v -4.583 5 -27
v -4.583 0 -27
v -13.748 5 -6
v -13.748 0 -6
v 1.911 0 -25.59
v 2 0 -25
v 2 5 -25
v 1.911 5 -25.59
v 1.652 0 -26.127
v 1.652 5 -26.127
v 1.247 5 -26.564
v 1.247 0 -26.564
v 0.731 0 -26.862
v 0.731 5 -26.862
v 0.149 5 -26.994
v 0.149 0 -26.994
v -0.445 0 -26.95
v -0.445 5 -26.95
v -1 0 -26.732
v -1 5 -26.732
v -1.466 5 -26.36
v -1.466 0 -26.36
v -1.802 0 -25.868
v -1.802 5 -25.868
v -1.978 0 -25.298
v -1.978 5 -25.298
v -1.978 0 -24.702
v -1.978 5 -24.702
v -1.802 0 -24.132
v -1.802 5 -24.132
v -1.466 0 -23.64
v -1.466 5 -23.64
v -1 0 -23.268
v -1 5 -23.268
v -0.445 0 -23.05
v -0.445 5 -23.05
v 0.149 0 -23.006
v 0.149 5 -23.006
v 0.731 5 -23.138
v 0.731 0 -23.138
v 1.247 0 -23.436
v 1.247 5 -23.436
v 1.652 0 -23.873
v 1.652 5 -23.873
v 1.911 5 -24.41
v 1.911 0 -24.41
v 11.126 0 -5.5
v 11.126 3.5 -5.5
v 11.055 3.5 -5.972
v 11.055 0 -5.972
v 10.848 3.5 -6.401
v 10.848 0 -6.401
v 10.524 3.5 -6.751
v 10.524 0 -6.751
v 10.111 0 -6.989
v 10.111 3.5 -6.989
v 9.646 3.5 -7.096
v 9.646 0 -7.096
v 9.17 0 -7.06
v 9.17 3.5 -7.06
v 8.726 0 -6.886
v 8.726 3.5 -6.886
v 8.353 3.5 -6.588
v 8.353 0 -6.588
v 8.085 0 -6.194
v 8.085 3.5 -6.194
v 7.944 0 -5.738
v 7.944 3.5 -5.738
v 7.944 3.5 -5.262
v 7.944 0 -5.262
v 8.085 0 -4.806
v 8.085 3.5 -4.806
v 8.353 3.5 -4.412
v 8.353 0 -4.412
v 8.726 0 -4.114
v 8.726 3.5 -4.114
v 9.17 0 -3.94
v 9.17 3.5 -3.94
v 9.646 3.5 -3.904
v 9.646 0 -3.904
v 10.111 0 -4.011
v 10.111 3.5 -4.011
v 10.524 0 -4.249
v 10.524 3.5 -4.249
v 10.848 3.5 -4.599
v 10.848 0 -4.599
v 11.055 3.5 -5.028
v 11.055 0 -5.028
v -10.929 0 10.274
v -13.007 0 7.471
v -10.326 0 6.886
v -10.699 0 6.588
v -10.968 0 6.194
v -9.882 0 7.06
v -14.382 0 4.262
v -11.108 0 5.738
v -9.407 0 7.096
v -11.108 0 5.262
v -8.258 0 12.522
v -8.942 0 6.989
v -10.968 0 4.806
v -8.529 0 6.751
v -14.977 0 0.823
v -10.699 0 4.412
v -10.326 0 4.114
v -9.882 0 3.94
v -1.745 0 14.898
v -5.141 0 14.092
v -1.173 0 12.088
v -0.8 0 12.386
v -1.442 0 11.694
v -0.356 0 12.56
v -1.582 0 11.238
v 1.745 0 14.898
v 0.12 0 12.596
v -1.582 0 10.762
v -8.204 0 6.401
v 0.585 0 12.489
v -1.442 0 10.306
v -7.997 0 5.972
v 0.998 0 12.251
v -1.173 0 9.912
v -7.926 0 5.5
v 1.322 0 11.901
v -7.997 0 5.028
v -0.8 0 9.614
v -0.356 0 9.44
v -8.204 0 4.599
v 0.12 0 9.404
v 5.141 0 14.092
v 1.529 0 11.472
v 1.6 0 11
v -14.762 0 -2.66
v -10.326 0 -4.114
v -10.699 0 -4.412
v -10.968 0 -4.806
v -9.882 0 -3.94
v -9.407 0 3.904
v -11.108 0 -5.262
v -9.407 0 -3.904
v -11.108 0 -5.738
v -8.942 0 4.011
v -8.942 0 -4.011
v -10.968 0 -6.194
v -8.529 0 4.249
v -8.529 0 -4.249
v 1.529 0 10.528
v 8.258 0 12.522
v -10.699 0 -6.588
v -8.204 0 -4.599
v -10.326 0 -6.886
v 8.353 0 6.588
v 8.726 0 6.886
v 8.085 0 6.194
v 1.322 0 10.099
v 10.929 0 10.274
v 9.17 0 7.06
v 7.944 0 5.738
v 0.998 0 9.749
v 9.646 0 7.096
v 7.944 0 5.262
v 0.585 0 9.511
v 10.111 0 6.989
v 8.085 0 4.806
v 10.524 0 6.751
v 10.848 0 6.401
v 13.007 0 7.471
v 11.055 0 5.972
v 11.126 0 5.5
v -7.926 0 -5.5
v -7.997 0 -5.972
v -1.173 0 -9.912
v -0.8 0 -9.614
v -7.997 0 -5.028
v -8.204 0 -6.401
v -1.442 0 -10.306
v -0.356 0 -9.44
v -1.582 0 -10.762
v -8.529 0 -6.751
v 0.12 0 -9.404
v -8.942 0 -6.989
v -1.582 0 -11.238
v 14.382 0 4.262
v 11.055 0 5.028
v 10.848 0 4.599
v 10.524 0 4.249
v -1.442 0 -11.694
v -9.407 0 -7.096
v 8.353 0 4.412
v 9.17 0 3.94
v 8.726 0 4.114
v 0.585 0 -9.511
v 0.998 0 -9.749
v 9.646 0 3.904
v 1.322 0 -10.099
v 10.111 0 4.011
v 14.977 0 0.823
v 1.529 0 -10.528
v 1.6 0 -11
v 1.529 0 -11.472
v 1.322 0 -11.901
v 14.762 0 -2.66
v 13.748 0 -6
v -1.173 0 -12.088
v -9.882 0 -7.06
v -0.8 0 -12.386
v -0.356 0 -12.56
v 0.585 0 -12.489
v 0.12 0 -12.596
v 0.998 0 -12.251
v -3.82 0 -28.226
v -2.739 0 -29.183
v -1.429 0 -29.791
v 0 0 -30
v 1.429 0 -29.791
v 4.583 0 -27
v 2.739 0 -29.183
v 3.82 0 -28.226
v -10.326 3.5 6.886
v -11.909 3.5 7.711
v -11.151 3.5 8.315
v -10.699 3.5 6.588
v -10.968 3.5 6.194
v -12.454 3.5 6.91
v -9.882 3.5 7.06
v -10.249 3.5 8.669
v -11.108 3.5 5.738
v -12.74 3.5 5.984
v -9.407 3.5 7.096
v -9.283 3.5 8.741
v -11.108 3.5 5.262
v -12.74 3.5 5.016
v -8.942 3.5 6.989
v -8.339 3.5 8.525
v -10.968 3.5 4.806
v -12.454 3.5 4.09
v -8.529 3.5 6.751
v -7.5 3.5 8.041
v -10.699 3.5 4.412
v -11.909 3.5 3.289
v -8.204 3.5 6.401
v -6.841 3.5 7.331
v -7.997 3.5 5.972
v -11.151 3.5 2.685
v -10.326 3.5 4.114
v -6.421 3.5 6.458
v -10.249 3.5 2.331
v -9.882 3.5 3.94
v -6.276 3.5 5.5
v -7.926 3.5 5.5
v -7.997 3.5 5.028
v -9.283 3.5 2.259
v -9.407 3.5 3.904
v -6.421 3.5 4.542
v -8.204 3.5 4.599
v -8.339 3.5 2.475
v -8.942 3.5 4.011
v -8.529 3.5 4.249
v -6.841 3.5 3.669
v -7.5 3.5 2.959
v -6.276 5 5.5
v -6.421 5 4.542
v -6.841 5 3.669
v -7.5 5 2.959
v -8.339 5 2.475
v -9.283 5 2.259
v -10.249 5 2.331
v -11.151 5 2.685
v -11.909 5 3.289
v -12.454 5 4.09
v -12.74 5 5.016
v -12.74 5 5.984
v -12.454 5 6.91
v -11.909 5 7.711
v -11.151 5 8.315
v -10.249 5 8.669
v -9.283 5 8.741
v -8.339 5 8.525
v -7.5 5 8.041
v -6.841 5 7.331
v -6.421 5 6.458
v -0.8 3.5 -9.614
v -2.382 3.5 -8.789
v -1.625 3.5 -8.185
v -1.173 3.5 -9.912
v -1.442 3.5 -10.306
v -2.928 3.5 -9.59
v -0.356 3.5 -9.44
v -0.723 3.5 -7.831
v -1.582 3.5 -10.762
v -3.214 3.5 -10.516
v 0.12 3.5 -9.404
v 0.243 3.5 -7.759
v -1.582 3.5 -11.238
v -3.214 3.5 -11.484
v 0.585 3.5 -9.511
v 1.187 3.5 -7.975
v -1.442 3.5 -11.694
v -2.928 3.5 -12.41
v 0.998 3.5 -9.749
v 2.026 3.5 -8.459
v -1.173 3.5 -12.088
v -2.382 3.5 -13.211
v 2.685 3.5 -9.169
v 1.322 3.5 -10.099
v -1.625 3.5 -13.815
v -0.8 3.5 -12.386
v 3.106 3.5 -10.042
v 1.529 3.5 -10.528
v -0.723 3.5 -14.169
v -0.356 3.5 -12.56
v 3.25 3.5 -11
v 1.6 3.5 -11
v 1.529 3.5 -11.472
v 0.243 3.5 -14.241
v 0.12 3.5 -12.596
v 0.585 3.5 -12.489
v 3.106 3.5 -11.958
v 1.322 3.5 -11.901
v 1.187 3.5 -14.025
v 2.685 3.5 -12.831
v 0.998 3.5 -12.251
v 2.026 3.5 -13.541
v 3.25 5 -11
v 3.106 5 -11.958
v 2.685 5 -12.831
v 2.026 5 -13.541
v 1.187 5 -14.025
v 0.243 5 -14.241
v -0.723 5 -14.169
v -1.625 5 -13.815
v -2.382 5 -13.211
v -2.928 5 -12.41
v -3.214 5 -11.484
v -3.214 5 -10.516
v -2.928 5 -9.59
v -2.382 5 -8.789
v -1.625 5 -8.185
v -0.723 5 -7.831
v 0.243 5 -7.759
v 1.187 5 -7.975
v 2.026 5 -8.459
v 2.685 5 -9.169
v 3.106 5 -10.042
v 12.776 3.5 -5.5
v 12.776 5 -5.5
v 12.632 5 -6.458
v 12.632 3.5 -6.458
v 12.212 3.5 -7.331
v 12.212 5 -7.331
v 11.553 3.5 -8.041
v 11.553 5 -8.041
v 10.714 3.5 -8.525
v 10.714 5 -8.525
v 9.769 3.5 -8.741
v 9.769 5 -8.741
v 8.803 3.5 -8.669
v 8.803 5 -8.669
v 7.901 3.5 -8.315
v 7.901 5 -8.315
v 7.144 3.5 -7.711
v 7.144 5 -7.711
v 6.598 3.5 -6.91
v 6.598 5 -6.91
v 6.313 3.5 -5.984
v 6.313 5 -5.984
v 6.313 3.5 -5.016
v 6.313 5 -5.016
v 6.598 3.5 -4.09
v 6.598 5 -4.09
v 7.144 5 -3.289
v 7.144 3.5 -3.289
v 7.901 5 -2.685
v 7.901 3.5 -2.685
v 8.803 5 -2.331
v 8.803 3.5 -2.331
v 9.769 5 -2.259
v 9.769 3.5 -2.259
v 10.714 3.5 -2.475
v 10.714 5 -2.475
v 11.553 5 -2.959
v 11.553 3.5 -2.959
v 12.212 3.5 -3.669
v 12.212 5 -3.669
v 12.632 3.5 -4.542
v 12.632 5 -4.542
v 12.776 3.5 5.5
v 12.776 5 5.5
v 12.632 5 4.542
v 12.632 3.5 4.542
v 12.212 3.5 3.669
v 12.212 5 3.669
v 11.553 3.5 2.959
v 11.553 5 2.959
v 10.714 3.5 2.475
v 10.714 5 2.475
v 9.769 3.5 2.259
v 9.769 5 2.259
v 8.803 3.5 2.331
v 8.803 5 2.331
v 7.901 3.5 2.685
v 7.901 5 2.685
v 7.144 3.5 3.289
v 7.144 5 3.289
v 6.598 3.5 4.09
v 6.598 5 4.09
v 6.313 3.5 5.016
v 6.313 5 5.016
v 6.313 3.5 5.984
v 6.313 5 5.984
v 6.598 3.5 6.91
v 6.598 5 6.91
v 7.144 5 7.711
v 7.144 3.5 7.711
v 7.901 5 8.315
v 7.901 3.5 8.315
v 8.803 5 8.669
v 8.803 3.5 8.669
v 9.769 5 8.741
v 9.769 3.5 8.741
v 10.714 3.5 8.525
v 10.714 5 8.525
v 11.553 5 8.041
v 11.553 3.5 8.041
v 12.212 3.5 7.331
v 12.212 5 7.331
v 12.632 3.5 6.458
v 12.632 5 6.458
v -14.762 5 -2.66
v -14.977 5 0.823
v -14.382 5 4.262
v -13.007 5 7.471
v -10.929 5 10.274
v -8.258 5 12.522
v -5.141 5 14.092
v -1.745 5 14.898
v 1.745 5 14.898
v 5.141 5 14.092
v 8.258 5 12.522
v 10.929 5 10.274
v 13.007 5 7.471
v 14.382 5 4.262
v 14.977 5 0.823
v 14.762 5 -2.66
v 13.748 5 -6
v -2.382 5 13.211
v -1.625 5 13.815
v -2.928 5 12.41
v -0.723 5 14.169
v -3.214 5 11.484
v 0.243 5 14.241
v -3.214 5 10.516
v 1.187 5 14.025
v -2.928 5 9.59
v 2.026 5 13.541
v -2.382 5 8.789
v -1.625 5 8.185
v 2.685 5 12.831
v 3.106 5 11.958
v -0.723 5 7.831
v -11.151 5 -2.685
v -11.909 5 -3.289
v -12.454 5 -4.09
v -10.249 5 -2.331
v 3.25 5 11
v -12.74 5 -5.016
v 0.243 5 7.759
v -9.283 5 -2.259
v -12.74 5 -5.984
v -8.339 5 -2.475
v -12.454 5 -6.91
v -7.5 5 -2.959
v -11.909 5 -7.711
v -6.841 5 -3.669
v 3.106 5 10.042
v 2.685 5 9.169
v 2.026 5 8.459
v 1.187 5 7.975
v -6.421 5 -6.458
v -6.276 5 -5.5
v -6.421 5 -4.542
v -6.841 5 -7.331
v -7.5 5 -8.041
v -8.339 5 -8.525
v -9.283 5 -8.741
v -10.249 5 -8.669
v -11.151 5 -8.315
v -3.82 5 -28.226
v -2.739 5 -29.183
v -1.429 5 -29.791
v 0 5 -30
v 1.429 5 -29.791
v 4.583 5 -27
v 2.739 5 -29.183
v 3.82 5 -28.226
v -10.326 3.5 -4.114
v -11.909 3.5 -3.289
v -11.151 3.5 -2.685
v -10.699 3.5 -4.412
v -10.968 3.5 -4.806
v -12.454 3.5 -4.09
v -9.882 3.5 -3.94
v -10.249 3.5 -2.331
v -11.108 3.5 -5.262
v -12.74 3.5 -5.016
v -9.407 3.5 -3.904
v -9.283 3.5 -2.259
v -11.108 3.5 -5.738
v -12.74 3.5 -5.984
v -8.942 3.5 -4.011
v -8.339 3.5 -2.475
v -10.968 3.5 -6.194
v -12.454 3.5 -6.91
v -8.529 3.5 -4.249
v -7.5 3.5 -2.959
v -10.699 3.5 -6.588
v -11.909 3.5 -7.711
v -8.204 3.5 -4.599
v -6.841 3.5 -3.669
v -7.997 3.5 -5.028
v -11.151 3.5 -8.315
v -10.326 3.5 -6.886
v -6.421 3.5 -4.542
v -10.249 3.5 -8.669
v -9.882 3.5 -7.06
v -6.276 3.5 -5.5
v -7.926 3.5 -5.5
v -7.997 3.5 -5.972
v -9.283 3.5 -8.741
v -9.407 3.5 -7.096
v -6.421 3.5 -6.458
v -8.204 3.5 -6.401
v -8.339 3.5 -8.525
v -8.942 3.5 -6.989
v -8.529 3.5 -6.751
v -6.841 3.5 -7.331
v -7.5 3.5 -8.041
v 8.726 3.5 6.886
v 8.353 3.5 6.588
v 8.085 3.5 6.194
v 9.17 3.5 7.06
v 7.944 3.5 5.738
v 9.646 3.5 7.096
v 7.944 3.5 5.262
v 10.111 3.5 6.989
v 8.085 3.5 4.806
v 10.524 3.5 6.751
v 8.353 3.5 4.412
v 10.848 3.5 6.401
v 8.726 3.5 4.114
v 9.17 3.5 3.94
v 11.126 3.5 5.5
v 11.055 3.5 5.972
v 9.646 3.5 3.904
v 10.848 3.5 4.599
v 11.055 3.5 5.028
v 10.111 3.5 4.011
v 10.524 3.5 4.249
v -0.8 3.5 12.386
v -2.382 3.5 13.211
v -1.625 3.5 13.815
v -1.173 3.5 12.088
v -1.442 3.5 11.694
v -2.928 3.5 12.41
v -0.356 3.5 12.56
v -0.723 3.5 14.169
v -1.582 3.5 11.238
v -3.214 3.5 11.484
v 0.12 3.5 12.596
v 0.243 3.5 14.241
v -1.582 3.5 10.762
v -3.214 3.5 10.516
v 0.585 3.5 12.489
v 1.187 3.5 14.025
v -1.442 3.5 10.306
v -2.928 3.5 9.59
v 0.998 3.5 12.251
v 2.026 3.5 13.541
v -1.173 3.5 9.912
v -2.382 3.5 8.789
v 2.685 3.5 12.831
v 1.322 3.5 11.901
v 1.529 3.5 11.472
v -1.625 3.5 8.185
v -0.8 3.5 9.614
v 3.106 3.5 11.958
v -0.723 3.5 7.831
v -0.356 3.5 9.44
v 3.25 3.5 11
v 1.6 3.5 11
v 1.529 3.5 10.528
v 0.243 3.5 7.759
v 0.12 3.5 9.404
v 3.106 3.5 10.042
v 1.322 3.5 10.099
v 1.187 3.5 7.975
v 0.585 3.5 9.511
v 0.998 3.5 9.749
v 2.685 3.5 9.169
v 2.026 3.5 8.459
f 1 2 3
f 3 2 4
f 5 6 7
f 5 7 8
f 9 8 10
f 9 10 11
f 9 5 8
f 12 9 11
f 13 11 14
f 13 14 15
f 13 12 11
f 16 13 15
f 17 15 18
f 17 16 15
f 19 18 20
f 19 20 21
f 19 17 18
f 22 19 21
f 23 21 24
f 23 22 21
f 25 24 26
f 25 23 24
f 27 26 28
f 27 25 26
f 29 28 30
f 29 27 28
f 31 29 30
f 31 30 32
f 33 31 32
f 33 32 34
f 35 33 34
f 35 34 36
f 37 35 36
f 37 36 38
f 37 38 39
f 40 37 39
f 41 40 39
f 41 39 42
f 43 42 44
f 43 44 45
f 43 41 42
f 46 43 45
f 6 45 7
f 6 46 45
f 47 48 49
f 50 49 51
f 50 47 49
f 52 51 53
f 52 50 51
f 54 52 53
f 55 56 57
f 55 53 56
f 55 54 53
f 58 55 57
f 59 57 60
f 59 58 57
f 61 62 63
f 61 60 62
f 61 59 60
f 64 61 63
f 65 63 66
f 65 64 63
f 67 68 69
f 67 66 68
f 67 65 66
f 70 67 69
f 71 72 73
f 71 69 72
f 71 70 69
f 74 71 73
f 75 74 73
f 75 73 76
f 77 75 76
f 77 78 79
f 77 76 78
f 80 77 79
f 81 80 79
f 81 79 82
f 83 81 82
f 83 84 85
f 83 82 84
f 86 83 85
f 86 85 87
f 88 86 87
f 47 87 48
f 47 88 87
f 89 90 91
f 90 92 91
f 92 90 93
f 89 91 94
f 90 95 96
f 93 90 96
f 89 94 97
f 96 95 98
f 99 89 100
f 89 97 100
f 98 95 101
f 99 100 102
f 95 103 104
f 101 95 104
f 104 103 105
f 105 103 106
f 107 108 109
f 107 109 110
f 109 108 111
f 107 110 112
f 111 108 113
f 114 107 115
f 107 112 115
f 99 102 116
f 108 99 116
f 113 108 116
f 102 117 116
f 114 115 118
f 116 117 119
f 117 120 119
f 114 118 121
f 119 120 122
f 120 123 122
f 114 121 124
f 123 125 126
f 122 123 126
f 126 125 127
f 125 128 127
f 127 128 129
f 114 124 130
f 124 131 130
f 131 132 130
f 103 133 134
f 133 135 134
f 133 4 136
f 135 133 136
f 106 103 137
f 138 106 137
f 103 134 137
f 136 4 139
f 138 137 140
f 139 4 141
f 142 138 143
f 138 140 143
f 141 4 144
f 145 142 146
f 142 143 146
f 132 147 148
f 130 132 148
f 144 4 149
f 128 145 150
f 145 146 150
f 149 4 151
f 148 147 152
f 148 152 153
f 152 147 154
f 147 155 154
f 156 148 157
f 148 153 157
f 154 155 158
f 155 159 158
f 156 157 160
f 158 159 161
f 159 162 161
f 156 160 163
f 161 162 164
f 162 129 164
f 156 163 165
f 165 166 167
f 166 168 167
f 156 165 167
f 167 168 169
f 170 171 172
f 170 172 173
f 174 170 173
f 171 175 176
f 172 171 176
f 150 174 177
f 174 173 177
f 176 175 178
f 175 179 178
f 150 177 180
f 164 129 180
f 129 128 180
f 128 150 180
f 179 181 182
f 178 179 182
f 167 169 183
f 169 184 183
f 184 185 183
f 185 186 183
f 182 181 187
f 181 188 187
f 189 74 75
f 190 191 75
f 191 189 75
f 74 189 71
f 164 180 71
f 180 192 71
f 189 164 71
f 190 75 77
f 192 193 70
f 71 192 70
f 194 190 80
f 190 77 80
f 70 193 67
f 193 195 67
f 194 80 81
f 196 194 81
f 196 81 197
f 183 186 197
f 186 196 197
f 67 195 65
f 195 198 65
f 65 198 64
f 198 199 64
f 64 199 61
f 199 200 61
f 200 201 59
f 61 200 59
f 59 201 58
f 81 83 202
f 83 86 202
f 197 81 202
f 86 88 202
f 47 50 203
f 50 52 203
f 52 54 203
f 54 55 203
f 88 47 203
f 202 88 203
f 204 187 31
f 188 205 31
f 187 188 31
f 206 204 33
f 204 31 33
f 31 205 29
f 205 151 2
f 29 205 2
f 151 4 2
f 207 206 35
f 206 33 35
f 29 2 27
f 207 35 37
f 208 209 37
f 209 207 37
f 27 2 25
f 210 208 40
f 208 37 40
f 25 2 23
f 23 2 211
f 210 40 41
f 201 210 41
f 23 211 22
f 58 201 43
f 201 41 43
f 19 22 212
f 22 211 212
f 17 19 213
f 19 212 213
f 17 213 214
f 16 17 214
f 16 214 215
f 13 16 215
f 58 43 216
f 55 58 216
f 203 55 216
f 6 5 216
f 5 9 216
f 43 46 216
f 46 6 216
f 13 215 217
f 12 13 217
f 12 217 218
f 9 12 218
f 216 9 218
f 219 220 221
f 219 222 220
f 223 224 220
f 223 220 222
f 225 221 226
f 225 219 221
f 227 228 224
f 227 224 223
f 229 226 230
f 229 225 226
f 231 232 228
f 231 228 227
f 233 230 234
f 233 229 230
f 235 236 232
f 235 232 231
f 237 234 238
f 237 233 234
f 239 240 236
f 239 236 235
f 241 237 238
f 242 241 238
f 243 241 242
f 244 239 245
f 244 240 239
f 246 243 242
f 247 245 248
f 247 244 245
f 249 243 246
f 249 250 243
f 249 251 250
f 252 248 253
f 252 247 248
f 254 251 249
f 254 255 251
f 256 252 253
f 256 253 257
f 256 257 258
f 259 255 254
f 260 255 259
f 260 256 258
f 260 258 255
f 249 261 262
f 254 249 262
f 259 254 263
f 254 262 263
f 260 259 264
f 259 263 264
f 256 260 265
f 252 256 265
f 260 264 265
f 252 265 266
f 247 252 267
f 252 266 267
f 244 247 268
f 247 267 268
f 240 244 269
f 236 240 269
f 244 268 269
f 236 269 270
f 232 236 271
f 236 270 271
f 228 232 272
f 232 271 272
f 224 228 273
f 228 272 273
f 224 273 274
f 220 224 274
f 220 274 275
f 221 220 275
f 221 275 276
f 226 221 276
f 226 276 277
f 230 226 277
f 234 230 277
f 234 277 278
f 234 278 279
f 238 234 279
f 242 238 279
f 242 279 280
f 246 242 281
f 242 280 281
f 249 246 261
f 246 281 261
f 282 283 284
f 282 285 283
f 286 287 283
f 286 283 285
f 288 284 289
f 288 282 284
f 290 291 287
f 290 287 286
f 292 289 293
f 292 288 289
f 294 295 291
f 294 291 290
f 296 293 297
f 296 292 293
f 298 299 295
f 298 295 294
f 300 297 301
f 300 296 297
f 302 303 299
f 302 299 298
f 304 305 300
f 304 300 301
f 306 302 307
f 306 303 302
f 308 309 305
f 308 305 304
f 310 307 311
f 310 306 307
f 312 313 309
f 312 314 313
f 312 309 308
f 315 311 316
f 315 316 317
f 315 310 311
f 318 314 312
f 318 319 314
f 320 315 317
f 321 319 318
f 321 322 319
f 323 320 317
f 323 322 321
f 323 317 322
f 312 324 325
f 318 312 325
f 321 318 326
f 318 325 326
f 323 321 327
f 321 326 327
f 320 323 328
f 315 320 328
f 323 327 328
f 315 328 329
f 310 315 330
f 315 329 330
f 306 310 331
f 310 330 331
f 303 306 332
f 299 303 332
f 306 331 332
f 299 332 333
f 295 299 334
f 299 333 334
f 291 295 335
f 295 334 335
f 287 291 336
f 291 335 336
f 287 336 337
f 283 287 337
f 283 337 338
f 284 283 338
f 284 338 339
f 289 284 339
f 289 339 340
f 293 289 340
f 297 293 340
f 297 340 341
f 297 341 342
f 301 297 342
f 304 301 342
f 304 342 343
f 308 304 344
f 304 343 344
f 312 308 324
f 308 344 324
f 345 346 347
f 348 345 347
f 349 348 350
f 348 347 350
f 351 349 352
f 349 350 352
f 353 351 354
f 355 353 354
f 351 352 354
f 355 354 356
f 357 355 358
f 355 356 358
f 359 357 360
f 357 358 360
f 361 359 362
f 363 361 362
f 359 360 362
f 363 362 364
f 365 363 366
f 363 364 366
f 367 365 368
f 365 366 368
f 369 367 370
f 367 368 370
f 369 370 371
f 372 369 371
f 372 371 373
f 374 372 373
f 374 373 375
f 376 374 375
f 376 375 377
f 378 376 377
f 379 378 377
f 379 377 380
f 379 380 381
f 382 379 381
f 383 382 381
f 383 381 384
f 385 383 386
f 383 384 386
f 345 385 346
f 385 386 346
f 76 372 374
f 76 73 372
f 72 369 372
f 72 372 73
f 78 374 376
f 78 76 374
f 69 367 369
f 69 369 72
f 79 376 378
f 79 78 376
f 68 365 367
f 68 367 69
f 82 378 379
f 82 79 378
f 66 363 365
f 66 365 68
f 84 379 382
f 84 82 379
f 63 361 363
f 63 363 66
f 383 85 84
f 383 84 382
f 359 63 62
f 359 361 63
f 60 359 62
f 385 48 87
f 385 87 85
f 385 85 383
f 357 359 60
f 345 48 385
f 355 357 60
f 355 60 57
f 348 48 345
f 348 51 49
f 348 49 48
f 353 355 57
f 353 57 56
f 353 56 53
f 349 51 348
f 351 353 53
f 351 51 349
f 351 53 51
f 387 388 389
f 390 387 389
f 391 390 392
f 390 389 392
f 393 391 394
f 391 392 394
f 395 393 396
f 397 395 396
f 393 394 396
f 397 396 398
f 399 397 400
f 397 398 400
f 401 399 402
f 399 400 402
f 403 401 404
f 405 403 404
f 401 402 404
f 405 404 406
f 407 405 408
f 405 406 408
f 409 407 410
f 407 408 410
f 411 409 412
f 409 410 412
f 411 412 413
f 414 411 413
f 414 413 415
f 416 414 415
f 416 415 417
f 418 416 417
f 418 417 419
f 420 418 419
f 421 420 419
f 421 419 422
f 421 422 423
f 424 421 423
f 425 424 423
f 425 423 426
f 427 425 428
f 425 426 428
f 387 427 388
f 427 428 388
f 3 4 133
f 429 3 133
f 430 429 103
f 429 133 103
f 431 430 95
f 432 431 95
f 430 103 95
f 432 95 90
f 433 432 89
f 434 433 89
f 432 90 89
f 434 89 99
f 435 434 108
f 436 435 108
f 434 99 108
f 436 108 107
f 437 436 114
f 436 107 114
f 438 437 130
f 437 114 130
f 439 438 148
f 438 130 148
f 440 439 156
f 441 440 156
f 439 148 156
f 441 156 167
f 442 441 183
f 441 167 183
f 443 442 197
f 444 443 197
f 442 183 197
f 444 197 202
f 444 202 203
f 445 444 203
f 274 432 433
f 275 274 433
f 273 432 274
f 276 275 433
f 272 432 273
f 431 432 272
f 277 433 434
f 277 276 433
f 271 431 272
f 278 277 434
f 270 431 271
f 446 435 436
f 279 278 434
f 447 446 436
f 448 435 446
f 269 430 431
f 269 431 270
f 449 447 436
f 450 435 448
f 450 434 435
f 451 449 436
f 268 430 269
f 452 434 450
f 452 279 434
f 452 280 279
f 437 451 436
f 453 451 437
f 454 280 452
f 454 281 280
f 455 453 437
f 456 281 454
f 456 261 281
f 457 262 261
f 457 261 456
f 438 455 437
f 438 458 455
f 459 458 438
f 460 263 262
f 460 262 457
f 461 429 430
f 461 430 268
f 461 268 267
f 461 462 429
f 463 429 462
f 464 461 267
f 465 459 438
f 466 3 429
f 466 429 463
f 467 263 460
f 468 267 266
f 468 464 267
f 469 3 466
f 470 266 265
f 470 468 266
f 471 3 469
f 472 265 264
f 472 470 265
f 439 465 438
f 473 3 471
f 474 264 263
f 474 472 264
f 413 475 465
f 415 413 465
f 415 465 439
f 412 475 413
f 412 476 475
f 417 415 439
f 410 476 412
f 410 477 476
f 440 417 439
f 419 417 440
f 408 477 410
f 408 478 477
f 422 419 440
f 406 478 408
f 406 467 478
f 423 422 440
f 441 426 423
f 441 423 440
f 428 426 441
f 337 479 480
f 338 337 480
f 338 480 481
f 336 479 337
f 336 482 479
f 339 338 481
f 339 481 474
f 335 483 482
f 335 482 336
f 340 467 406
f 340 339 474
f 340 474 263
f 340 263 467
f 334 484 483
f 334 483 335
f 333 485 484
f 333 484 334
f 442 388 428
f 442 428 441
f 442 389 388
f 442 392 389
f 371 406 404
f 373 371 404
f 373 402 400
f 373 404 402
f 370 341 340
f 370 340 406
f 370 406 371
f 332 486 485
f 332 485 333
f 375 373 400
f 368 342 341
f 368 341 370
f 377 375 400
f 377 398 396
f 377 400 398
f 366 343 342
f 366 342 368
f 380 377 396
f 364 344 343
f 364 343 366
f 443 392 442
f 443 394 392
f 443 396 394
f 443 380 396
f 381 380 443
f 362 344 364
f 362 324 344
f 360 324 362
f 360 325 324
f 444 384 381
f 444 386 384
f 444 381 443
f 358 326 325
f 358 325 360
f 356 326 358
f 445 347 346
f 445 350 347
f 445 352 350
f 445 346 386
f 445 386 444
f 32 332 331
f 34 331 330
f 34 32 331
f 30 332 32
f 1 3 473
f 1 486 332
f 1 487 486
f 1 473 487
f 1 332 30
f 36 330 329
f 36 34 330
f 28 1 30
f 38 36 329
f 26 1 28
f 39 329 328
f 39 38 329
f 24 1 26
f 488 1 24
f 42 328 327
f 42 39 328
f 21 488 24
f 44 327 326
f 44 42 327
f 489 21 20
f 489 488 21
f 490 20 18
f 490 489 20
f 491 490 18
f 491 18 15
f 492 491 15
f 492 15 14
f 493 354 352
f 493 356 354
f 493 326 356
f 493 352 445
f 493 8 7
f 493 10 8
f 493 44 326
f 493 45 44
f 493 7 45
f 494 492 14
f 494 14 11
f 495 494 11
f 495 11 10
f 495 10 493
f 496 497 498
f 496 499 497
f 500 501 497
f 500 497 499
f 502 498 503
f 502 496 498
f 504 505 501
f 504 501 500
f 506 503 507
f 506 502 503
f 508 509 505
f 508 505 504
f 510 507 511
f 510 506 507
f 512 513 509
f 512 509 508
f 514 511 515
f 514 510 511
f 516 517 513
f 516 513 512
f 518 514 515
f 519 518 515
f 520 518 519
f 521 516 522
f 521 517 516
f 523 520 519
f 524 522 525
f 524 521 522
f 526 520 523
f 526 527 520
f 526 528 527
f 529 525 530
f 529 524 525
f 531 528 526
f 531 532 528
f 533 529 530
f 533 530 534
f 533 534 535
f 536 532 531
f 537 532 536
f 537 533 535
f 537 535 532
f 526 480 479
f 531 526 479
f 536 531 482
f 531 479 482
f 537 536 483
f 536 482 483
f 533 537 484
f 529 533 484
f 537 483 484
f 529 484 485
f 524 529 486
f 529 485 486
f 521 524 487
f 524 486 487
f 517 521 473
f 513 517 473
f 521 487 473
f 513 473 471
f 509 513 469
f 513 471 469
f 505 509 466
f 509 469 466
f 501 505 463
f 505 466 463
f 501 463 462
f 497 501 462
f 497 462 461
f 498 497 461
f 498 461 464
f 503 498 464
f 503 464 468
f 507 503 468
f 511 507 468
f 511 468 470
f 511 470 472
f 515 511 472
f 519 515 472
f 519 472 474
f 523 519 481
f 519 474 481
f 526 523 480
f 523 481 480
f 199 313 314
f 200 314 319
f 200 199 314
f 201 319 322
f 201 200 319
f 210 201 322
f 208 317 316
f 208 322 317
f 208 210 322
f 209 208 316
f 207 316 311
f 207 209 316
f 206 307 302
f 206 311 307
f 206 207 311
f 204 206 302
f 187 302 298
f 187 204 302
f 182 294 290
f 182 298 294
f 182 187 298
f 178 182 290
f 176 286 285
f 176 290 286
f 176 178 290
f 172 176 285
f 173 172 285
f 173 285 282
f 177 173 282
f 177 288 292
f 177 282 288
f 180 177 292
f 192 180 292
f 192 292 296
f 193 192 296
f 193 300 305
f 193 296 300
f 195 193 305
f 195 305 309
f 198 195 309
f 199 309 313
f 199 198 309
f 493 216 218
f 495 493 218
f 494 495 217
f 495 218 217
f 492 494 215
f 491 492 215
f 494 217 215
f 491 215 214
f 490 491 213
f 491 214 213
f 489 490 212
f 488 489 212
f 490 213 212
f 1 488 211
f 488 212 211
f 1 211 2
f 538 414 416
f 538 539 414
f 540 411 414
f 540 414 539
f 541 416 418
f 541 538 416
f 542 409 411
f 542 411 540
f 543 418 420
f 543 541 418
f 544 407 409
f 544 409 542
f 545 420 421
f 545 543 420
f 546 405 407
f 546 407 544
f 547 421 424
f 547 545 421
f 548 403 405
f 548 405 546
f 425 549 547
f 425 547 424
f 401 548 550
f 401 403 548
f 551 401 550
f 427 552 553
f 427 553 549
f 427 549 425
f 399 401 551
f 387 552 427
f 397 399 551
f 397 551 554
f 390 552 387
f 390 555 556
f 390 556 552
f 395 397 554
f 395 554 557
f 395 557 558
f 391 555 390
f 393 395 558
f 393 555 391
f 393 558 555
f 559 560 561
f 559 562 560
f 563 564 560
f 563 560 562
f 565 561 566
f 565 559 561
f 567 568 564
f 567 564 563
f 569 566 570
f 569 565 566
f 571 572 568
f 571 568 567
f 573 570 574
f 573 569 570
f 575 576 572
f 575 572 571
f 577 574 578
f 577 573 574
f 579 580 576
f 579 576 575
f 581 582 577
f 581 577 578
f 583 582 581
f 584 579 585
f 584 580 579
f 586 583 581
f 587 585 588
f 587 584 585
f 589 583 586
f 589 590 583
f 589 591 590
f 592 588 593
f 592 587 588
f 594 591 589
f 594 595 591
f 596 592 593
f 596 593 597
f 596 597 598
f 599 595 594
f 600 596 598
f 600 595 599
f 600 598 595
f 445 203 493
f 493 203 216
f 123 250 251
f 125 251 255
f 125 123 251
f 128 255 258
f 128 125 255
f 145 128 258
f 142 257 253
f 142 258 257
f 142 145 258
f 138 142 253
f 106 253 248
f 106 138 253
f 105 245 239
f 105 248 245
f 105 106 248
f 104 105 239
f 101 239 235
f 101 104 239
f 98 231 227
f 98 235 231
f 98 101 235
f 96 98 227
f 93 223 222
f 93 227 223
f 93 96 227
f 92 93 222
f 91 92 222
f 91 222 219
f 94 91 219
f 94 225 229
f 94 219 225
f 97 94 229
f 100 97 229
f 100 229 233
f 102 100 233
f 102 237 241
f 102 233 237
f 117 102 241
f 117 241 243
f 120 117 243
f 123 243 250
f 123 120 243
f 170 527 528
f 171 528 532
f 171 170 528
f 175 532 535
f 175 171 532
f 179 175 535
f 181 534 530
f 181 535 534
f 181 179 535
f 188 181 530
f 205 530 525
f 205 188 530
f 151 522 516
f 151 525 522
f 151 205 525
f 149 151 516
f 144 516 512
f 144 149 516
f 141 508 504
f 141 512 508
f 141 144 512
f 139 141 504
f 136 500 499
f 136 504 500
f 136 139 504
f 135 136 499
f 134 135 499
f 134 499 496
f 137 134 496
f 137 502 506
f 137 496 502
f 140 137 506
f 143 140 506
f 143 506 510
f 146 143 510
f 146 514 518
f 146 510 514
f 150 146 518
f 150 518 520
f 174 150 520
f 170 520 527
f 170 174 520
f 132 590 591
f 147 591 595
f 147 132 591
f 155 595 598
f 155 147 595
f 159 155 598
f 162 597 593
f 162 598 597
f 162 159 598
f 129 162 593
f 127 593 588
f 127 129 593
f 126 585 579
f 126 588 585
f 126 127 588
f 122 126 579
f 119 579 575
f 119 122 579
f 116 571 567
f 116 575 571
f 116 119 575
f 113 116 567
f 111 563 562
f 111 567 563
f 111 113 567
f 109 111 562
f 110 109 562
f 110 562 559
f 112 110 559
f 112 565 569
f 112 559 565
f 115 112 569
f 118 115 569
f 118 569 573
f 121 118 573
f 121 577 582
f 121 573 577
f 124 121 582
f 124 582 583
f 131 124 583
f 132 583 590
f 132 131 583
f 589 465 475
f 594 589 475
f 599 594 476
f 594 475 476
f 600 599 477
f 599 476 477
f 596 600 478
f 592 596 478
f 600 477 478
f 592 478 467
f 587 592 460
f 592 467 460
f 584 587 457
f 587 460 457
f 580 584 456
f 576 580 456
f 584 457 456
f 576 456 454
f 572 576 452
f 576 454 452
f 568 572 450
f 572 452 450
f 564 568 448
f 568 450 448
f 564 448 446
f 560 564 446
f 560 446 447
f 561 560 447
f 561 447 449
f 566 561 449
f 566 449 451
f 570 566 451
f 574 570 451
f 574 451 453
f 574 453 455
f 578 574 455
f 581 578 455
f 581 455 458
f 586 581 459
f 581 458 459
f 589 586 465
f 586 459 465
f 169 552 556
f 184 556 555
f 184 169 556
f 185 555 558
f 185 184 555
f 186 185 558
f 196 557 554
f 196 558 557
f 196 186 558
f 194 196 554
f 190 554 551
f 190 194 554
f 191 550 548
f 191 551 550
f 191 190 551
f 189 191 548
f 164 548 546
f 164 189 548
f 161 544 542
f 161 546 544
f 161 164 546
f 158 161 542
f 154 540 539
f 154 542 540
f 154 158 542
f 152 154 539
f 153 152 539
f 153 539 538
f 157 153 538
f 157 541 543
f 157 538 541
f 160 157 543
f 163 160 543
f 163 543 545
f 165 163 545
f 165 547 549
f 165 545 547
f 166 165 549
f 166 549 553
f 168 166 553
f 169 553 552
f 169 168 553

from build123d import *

# Parameters (mm, degrees)
SKETCH4_R           = 2
SKETCH4_R_2         = 1.6
BOSS_EXTRUDE1_DEPTH = 5
SKETCH6_R           = 3.25
CUT_EXTRUDE1_DEPTH  = 1.5


with BuildPart() as part:
    # Sketch4 → Boss-Extrude1 (new body)
    with BuildSketch(Plane(origin=(0, 0, 0), x_dir=(1, 0, 0), z_dir=(0, 1, 0))):
        with BuildLine():
            Line((13.747727085, 6), (4.582575695, 27))
            ThreePointArc((4.582575695, 27), (0, 30), (-4.582575695, 27))
            Line((-4.582575695, 27), (-13.747727085, 6))
            ThreePointArc((-13.747727085, 6), (0, -15), (13.747727085, 6))
        make_face()
        with Locations((0, 25)):
            Circle(SKETCH4_R, mode=Mode.SUBTRACT)
        with Locations((0, 11)):
            Circle(SKETCH4_R_2, mode=Mode.SUBTRACT)
        with Locations((-9.526279442, -5.5)):
            Circle(SKETCH4_R_2, mode=Mode.SUBTRACT)
        with Locations((-9.526279442, 5.5)):
            Circle(SKETCH4_R_2, mode=Mode.SUBTRACT)
        with Locations((0, -11)):
            Circle(SKETCH4_R_2, mode=Mode.SUBTRACT)
        with Locations((9.526279442, -5.5)):
            Circle(SKETCH4_R_2, mode=Mode.SUBTRACT)
        with Locations((9.526279442, 5.5)):
            Circle(SKETCH4_R_2, mode=Mode.SUBTRACT)
    extrude(amount=BOSS_EXTRUDE1_DEPTH)

    # Sketch6 → Cut-Extrude1 (cut)
    with BuildSketch(Plane(origin=(0, 5, 0), x_dir=(1, 0, 0), z_dir=(0, 1, 0))):
        with Locations((0, 11)):
            Circle(SKETCH6_R)
        with Locations((9.526279442, 5.5)):
            Circle(SKETCH6_R)
        with Locations((9.526279442, -5.5)):
            Circle(SKETCH6_R)
        with Locations((0, -11)):
            Circle(SKETCH6_R)
        with Locations((-9.526279442, -5.5)):
            Circle(SKETCH6_R)
        with Locations((-9.526279442, 5.5)):
            Circle(SKETCH6_R)
    extrude(amount=-CUT_EXTRUDE1_DEPTH, mode=Mode.SUBTRACT)


solid = part.part
